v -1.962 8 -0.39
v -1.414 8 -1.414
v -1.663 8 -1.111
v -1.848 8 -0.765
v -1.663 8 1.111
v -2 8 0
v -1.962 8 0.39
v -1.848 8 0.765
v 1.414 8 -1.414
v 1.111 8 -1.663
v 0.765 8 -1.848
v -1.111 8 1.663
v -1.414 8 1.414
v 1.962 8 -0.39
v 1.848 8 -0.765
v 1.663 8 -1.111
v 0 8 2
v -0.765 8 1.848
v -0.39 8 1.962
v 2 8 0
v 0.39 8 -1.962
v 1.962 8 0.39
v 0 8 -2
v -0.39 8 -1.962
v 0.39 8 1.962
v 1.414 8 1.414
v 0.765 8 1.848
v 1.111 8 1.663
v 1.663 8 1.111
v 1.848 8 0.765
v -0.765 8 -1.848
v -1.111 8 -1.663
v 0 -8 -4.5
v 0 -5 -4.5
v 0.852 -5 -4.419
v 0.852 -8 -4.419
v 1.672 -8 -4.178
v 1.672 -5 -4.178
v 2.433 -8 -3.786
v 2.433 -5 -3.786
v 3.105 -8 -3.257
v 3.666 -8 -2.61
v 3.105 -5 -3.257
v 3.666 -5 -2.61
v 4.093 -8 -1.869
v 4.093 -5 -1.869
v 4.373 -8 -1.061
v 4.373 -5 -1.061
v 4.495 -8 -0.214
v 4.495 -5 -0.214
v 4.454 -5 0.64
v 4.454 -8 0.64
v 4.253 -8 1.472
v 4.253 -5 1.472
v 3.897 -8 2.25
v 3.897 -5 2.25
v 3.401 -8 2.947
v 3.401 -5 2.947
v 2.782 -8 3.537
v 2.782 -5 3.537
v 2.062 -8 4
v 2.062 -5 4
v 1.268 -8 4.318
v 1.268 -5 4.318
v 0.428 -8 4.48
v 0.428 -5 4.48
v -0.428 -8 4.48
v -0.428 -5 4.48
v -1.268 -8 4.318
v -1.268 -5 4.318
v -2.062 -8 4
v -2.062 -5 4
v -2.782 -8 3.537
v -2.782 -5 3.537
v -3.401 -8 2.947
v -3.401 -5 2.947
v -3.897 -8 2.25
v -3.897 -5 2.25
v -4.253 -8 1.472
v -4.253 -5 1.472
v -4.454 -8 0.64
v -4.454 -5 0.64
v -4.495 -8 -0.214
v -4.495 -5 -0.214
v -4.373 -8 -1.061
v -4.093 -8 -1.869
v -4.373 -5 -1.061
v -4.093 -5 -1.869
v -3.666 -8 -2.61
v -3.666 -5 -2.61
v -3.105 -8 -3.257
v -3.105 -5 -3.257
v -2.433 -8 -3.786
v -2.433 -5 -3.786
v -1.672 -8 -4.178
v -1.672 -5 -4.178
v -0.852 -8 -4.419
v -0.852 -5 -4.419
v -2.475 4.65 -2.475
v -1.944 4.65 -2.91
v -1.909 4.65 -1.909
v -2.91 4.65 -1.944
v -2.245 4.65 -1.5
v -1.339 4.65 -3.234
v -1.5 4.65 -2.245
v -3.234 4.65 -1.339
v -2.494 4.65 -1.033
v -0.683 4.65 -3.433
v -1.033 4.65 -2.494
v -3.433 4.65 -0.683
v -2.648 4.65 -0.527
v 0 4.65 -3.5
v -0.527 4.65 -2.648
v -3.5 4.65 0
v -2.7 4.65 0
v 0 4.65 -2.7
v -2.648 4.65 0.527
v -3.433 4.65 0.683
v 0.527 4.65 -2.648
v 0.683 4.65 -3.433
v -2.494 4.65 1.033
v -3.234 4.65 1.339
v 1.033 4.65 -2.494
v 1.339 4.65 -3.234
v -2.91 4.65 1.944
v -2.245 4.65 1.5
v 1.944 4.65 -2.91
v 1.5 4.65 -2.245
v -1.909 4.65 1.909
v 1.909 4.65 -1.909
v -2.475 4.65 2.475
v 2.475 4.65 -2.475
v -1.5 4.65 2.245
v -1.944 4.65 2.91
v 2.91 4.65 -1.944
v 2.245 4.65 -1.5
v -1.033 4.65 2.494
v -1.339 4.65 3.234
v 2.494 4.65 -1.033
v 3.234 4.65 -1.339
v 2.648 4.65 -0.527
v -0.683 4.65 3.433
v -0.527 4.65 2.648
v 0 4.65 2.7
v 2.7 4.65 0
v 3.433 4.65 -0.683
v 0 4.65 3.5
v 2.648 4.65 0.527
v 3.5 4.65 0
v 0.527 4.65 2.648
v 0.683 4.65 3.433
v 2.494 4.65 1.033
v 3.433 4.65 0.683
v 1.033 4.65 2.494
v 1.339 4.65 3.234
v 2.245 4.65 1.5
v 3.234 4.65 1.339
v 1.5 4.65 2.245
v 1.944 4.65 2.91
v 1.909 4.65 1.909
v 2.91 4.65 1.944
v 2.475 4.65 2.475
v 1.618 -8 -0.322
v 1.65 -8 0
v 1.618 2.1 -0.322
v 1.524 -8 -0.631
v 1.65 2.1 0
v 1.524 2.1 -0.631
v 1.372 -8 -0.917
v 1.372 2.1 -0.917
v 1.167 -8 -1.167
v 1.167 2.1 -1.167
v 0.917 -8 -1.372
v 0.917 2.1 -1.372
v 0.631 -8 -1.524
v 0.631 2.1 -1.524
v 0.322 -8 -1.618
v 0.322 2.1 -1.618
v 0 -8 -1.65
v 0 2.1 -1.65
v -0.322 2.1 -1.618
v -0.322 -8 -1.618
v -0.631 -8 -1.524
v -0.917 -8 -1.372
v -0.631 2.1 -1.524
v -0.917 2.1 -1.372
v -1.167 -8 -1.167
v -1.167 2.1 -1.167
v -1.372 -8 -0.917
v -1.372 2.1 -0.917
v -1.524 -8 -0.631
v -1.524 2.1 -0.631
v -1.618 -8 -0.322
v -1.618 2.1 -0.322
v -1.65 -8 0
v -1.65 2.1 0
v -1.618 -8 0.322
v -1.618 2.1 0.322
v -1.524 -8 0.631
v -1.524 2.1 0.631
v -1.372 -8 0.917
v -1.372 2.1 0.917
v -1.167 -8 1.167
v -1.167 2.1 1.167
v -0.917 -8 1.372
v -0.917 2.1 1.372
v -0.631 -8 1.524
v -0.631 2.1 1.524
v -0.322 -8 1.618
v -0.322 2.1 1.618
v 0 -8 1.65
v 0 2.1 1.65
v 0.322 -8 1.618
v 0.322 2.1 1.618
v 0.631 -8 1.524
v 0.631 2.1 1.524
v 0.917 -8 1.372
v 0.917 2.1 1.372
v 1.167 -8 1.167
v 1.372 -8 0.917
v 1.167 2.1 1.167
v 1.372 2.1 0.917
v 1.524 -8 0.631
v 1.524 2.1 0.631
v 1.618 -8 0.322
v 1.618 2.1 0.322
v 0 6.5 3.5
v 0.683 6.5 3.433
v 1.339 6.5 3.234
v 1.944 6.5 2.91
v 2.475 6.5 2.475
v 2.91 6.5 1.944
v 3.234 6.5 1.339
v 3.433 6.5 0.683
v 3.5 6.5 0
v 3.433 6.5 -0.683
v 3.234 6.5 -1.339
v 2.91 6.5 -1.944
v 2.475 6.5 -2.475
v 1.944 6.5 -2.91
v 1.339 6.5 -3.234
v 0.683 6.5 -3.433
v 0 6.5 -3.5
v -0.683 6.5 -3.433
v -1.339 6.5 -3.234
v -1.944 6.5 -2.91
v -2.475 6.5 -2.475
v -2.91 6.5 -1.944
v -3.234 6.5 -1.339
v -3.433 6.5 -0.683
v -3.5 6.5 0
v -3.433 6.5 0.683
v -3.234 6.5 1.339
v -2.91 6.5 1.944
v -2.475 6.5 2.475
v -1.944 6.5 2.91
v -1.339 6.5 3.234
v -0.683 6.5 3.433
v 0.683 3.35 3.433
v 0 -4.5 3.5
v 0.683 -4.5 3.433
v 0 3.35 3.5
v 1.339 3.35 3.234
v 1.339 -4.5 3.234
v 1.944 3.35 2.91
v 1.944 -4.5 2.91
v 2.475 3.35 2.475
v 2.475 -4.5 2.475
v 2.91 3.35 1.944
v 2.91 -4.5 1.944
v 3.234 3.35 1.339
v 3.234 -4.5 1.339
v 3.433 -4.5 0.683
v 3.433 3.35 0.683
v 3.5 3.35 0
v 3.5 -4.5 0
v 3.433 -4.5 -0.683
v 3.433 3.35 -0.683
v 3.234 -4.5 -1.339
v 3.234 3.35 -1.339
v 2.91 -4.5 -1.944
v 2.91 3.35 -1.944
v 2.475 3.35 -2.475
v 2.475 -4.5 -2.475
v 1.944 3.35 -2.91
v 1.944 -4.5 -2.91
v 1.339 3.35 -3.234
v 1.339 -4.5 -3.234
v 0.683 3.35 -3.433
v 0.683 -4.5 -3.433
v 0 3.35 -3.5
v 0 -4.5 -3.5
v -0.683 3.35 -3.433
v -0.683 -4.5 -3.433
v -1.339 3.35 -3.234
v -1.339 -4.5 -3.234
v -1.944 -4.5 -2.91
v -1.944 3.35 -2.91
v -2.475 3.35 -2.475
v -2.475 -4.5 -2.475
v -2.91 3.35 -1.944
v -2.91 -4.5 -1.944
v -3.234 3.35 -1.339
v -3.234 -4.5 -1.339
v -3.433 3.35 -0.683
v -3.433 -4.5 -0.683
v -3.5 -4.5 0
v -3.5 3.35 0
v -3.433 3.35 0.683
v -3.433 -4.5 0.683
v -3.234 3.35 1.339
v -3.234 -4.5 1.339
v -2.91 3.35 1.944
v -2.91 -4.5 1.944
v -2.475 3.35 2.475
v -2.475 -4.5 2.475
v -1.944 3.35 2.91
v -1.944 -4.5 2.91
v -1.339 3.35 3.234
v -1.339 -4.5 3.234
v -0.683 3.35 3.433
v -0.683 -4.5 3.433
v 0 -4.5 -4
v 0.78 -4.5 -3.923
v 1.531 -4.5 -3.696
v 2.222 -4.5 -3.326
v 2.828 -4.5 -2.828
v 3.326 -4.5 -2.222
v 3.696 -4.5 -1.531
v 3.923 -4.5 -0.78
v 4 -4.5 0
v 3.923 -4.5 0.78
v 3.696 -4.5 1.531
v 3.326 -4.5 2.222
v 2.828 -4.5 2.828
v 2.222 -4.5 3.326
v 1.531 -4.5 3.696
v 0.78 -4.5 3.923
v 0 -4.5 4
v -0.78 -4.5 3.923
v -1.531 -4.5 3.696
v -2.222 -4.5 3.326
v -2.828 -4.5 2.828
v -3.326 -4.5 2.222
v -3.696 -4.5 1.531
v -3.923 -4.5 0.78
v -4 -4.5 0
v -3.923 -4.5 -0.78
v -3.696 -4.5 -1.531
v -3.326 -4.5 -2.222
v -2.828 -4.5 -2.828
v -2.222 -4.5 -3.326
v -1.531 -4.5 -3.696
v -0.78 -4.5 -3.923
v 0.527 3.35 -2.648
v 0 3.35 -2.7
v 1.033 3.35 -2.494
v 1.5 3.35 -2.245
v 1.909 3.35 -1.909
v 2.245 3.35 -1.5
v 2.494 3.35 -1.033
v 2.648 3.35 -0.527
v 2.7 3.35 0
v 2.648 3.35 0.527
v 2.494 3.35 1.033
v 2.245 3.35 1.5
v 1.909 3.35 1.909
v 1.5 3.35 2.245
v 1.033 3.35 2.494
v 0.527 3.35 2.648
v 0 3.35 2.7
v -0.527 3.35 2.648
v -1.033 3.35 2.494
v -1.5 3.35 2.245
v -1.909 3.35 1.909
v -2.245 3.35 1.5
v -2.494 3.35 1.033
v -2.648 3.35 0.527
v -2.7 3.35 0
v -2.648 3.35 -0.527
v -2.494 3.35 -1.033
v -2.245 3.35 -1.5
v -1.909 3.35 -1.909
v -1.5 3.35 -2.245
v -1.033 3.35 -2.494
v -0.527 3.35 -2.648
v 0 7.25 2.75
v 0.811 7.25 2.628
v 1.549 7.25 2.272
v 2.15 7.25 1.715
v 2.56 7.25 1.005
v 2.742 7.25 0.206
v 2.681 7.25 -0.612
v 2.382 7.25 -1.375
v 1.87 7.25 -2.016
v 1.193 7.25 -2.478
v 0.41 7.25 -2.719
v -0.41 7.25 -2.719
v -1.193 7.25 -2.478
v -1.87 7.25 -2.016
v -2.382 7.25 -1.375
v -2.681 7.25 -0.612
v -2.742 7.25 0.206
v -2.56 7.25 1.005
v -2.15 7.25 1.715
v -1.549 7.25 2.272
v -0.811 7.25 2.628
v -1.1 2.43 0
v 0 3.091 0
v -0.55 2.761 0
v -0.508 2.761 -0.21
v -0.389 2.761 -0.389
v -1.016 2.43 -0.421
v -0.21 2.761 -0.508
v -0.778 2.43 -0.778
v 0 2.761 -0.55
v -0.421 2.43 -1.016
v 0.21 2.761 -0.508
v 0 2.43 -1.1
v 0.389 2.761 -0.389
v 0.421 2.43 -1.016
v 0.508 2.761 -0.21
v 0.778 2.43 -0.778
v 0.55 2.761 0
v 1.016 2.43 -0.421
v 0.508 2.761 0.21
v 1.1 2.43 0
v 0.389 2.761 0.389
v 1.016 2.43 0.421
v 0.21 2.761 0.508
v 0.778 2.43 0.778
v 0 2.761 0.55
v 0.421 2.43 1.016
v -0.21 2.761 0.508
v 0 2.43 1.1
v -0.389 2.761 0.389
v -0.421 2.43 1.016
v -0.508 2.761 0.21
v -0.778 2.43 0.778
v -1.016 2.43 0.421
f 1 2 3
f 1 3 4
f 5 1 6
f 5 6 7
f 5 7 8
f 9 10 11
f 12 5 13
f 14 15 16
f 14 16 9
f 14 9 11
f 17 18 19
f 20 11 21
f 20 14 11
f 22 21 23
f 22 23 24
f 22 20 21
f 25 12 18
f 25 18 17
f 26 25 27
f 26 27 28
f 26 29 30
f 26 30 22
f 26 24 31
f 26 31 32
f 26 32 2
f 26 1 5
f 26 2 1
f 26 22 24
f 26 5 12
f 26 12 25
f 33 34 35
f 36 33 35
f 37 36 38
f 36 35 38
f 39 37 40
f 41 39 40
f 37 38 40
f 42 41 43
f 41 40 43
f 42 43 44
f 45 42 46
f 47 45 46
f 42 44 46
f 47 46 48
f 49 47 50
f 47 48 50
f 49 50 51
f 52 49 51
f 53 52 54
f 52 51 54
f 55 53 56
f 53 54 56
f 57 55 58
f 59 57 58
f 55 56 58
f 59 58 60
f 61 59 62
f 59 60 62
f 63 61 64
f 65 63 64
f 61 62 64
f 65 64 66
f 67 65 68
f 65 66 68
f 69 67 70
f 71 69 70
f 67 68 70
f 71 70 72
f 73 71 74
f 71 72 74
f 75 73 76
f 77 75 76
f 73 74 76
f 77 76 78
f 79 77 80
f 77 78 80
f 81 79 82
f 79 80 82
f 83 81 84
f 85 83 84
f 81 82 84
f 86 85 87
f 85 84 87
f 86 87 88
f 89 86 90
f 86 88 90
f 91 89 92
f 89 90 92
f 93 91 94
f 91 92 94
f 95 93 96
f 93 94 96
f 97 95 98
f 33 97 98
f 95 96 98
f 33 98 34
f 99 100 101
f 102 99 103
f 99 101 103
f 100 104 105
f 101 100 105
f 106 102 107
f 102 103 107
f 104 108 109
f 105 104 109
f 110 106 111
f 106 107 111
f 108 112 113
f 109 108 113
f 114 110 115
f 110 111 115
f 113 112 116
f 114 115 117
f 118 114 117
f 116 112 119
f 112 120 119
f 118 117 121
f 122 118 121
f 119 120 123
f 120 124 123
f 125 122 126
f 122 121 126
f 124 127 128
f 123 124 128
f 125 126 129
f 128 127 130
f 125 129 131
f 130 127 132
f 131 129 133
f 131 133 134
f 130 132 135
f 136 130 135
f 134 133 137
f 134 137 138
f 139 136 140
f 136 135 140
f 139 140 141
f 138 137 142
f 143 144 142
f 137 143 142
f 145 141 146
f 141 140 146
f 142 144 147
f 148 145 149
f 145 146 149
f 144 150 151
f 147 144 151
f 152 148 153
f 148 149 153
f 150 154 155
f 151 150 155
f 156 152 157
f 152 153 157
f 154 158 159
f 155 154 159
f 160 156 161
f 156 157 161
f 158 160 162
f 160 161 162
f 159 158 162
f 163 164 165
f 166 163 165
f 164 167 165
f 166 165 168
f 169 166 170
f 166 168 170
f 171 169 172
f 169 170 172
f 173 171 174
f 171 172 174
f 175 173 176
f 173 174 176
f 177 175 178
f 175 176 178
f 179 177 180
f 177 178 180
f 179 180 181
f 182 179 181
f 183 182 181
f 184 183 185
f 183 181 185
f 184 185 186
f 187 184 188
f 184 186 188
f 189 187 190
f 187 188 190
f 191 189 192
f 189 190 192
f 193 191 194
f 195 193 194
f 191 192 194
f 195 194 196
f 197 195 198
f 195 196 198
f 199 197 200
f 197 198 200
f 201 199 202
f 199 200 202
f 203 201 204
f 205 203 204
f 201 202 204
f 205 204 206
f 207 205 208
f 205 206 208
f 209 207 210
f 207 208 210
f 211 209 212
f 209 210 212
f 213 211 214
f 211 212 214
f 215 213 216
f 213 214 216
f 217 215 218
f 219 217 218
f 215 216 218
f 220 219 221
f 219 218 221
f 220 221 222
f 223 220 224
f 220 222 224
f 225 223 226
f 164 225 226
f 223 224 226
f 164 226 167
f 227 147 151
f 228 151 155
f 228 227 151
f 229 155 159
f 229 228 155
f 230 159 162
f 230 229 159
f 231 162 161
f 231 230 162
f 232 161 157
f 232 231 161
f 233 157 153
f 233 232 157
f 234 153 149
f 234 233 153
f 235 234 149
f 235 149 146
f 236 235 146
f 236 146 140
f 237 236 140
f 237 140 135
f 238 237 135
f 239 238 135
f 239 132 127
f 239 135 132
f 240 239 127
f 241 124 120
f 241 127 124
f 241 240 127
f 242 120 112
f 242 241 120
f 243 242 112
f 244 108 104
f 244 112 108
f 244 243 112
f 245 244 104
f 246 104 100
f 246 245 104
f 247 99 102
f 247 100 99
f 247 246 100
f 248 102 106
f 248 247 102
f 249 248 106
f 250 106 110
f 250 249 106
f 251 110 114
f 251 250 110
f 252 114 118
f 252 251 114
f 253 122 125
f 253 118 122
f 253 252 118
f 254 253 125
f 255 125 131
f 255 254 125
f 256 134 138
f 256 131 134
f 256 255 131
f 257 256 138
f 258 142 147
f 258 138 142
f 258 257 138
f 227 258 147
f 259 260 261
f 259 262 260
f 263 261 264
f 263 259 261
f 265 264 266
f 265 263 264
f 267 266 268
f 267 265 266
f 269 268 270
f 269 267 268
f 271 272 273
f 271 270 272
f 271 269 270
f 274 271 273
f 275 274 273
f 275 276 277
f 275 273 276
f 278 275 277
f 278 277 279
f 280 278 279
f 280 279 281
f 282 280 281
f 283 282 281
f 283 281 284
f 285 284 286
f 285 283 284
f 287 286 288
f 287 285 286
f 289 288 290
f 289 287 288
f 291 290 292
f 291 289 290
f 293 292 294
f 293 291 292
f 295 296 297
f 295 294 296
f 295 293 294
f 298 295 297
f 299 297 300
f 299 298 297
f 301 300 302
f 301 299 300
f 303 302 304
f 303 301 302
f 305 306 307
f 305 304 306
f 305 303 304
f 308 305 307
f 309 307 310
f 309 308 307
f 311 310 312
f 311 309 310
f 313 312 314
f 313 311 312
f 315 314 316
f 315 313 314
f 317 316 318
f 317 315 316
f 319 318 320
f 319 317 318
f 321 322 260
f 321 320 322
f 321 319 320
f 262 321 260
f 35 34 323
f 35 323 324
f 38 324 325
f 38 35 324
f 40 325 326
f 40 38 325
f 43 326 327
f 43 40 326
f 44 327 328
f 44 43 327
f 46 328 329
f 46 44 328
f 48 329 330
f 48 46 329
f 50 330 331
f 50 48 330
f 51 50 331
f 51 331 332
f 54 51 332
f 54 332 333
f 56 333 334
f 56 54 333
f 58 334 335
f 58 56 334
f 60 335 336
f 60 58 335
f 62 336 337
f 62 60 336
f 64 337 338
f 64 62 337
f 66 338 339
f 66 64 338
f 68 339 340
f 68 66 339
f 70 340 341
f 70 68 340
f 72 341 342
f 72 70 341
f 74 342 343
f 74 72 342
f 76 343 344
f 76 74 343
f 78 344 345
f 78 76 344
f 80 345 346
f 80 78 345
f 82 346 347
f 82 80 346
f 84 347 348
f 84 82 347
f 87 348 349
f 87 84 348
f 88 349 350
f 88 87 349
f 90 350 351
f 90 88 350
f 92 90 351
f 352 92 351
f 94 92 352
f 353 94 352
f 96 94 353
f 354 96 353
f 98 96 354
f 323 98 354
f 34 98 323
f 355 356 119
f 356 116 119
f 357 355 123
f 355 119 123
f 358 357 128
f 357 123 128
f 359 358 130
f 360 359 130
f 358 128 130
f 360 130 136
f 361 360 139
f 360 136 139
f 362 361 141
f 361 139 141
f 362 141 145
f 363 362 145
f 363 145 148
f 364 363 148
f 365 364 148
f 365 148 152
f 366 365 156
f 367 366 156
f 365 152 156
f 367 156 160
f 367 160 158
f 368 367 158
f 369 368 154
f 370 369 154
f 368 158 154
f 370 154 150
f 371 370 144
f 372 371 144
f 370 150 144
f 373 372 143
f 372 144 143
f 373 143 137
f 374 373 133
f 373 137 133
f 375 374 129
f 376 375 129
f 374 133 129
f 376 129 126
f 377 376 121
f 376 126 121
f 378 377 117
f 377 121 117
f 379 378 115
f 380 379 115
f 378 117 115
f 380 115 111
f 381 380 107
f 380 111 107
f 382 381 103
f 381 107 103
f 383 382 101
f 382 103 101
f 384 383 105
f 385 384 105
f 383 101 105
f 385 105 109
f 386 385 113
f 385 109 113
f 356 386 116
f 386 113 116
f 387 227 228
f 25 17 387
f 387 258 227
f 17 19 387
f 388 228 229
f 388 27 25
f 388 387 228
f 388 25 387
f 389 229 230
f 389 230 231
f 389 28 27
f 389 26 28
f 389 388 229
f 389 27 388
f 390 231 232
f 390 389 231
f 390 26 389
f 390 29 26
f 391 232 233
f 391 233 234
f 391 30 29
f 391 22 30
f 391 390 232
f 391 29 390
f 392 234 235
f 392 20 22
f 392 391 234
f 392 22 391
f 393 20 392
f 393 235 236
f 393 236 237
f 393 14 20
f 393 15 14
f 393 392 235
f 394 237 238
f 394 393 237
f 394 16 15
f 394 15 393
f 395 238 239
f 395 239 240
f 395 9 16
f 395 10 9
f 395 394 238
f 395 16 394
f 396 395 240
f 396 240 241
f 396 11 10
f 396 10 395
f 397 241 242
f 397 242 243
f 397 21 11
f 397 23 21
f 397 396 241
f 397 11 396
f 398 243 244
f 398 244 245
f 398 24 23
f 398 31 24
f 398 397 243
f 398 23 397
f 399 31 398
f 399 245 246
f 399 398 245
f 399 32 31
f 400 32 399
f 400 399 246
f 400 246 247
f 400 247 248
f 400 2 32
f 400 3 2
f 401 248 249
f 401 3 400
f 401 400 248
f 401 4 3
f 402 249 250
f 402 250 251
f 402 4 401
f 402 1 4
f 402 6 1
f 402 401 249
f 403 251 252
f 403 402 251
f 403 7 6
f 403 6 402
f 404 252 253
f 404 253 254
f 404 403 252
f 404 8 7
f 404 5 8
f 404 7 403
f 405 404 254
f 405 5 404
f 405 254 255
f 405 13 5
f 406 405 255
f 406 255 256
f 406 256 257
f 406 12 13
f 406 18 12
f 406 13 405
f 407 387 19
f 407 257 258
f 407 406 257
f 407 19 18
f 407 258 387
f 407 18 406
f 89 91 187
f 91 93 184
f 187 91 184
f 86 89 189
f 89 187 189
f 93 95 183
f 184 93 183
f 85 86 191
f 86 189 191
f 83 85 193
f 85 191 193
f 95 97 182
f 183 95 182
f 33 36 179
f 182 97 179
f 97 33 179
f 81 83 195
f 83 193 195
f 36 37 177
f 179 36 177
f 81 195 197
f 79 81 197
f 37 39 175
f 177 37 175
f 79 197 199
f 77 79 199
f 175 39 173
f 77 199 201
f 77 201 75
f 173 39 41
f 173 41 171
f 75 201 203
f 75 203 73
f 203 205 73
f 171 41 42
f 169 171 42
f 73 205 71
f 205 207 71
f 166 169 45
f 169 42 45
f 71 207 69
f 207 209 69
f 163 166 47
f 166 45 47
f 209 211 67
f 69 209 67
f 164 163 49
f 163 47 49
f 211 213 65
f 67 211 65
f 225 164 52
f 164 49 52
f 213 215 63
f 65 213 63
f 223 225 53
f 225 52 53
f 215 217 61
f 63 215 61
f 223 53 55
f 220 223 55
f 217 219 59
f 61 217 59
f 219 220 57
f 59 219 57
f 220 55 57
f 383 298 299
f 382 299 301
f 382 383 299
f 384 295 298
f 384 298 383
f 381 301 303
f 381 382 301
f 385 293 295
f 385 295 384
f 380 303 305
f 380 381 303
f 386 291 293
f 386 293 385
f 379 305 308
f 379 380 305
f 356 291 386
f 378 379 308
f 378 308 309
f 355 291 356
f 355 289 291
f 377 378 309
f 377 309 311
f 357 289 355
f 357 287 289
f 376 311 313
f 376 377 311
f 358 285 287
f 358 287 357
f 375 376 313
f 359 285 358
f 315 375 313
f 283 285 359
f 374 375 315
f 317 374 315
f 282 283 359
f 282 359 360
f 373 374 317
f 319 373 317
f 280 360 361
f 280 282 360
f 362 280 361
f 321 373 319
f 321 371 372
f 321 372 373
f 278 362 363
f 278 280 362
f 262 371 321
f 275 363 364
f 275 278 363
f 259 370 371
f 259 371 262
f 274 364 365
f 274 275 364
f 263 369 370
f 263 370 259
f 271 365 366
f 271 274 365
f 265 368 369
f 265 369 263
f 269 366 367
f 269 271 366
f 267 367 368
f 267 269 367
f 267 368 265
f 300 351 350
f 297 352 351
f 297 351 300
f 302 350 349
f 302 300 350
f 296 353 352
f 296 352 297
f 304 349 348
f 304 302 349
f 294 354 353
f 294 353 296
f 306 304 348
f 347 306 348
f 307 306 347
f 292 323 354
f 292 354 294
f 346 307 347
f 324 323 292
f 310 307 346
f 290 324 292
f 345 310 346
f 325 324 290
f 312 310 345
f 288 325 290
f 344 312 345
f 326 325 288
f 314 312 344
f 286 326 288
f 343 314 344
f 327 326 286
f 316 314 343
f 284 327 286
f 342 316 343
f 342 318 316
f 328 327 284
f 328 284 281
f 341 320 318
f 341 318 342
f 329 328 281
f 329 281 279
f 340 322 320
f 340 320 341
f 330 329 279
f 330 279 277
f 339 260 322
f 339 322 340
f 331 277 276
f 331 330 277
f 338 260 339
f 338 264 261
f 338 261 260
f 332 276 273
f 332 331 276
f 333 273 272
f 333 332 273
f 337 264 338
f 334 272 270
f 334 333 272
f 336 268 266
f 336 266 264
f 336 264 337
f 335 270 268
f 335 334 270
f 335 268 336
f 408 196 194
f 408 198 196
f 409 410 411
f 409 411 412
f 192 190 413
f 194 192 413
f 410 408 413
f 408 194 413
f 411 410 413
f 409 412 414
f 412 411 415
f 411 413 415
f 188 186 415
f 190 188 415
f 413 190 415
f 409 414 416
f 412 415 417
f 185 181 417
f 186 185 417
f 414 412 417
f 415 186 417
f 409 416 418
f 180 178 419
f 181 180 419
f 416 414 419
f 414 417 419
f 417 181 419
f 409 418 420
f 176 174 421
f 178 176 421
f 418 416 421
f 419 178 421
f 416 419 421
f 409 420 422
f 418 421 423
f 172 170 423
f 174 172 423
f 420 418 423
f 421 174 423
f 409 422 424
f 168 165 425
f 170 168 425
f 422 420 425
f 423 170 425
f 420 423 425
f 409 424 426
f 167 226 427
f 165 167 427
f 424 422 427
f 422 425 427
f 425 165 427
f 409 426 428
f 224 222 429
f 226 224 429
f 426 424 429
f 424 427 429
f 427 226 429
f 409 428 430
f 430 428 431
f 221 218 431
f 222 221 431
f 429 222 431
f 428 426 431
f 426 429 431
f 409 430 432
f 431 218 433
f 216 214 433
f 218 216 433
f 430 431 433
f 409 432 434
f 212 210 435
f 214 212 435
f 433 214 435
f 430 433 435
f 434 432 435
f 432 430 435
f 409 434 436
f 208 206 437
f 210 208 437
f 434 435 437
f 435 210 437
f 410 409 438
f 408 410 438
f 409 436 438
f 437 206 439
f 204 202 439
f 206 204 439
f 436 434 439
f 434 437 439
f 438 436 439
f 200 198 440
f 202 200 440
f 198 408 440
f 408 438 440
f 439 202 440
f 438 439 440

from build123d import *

# Parameters (mm, degrees)
SKETCH_1_R             = 3.5
EXTRUDE_1_DEPTH        = 8
SKETCH_2_W             = 1
SKETCH_2_H             = 3.5
HOLE_WIZARD_M4_1_D     = 3.3
HOLE_WIZARD_M4_1_DEPTH = 10.1
HOLE_WIZARD_M4_1_TIP   = 0.991420021
CHAMFER_1_SIZE         = 1.5
SKETCH_6_W             = 0.8
SKETCH_6_H             = 1.3
CHAMFER_2_SIZE         = 0.5


with BuildPart() as part:
    # 草图1 → 凸台-拉伸1 (new, symmetric)
    with BuildSketch(Plane(origin=(0, 0, 0), x_dir=(1, 0, 0), z_dir=(0, 1, 0))):
        with Locations(Location((0, 0, 0), (0, 0, 270))):
            Circle(SKETCH_1_R)
    extrude(amount=EXTRUDE_1_DEPTH, both=True)

    # 草图2 → 旋转1 (revolve)
    with BuildSketch(Plane.XY, mode=Mode.PRIVATE) as revolve_1_sk:
        with Locations((4, -6.25)):
            Rectangle(SKETCH_2_W, SKETCH_2_H)
    revolve(revolve_1_sk.sketch.rotate(Axis((0, 8, 0), (0, -1, 0)), 270), axis=Axis((0, 8, 0), (0, -1, 0)))

    # M4 螺纹孔1
    with Locations(Plane(origin=(0, -8, 0), x_dir=(-1, 0, 0), z_dir=(0, -1, 0))):
        with Locations((0, 0)):
            Hole(HOLE_WIZARD_M4_1_D / 2, depth=HOLE_WIZARD_M4_1_DEPTH)
            with Locations((0, 0, -(HOLE_WIZARD_M4_1_DEPTH + HOLE_WIZARD_M4_1_TIP / 2))):  # 118° drill point
                Cone(0, HOLE_WIZARD_M4_1_D / 2, HOLE_WIZARD_M4_1_TIP, mode=Mode.SUBTRACT)

    # 倒角1
    chamfer_1_edges = [part.edges().sort_by_distance(p)[0] for p in [
        (0, 8, -3.5),
    ]]
    chamfer(chamfer_1_edges, length=CHAMFER_1_SIZE)

    # 草图6 → 切除-旋转1 (revolve, cut)
    with BuildSketch(Plane.XY, mode=Mode.PRIVATE) as cut_revolve_1_sk:
        with Locations((3.1, 4)):
            Rectangle(SKETCH_6_W, SKETCH_6_H)
    revolve(cut_revolve_1_sk.sketch.rotate(Axis((0, 8, 0), (0, -1, 0)), 270), axis=Axis((0, 8, 0), (0, -1, 0)), mode=Mode.SUBTRACT)

    # 倒角2
    chamfer_2_edges = [part.edges().sort_by_distance(p)[0] for p in [
        (0, -4.5, 4.5),
    ]]
    chamfer(chamfer_2_edges, length=CHAMFER_2_SIZE)


solid = part.part
